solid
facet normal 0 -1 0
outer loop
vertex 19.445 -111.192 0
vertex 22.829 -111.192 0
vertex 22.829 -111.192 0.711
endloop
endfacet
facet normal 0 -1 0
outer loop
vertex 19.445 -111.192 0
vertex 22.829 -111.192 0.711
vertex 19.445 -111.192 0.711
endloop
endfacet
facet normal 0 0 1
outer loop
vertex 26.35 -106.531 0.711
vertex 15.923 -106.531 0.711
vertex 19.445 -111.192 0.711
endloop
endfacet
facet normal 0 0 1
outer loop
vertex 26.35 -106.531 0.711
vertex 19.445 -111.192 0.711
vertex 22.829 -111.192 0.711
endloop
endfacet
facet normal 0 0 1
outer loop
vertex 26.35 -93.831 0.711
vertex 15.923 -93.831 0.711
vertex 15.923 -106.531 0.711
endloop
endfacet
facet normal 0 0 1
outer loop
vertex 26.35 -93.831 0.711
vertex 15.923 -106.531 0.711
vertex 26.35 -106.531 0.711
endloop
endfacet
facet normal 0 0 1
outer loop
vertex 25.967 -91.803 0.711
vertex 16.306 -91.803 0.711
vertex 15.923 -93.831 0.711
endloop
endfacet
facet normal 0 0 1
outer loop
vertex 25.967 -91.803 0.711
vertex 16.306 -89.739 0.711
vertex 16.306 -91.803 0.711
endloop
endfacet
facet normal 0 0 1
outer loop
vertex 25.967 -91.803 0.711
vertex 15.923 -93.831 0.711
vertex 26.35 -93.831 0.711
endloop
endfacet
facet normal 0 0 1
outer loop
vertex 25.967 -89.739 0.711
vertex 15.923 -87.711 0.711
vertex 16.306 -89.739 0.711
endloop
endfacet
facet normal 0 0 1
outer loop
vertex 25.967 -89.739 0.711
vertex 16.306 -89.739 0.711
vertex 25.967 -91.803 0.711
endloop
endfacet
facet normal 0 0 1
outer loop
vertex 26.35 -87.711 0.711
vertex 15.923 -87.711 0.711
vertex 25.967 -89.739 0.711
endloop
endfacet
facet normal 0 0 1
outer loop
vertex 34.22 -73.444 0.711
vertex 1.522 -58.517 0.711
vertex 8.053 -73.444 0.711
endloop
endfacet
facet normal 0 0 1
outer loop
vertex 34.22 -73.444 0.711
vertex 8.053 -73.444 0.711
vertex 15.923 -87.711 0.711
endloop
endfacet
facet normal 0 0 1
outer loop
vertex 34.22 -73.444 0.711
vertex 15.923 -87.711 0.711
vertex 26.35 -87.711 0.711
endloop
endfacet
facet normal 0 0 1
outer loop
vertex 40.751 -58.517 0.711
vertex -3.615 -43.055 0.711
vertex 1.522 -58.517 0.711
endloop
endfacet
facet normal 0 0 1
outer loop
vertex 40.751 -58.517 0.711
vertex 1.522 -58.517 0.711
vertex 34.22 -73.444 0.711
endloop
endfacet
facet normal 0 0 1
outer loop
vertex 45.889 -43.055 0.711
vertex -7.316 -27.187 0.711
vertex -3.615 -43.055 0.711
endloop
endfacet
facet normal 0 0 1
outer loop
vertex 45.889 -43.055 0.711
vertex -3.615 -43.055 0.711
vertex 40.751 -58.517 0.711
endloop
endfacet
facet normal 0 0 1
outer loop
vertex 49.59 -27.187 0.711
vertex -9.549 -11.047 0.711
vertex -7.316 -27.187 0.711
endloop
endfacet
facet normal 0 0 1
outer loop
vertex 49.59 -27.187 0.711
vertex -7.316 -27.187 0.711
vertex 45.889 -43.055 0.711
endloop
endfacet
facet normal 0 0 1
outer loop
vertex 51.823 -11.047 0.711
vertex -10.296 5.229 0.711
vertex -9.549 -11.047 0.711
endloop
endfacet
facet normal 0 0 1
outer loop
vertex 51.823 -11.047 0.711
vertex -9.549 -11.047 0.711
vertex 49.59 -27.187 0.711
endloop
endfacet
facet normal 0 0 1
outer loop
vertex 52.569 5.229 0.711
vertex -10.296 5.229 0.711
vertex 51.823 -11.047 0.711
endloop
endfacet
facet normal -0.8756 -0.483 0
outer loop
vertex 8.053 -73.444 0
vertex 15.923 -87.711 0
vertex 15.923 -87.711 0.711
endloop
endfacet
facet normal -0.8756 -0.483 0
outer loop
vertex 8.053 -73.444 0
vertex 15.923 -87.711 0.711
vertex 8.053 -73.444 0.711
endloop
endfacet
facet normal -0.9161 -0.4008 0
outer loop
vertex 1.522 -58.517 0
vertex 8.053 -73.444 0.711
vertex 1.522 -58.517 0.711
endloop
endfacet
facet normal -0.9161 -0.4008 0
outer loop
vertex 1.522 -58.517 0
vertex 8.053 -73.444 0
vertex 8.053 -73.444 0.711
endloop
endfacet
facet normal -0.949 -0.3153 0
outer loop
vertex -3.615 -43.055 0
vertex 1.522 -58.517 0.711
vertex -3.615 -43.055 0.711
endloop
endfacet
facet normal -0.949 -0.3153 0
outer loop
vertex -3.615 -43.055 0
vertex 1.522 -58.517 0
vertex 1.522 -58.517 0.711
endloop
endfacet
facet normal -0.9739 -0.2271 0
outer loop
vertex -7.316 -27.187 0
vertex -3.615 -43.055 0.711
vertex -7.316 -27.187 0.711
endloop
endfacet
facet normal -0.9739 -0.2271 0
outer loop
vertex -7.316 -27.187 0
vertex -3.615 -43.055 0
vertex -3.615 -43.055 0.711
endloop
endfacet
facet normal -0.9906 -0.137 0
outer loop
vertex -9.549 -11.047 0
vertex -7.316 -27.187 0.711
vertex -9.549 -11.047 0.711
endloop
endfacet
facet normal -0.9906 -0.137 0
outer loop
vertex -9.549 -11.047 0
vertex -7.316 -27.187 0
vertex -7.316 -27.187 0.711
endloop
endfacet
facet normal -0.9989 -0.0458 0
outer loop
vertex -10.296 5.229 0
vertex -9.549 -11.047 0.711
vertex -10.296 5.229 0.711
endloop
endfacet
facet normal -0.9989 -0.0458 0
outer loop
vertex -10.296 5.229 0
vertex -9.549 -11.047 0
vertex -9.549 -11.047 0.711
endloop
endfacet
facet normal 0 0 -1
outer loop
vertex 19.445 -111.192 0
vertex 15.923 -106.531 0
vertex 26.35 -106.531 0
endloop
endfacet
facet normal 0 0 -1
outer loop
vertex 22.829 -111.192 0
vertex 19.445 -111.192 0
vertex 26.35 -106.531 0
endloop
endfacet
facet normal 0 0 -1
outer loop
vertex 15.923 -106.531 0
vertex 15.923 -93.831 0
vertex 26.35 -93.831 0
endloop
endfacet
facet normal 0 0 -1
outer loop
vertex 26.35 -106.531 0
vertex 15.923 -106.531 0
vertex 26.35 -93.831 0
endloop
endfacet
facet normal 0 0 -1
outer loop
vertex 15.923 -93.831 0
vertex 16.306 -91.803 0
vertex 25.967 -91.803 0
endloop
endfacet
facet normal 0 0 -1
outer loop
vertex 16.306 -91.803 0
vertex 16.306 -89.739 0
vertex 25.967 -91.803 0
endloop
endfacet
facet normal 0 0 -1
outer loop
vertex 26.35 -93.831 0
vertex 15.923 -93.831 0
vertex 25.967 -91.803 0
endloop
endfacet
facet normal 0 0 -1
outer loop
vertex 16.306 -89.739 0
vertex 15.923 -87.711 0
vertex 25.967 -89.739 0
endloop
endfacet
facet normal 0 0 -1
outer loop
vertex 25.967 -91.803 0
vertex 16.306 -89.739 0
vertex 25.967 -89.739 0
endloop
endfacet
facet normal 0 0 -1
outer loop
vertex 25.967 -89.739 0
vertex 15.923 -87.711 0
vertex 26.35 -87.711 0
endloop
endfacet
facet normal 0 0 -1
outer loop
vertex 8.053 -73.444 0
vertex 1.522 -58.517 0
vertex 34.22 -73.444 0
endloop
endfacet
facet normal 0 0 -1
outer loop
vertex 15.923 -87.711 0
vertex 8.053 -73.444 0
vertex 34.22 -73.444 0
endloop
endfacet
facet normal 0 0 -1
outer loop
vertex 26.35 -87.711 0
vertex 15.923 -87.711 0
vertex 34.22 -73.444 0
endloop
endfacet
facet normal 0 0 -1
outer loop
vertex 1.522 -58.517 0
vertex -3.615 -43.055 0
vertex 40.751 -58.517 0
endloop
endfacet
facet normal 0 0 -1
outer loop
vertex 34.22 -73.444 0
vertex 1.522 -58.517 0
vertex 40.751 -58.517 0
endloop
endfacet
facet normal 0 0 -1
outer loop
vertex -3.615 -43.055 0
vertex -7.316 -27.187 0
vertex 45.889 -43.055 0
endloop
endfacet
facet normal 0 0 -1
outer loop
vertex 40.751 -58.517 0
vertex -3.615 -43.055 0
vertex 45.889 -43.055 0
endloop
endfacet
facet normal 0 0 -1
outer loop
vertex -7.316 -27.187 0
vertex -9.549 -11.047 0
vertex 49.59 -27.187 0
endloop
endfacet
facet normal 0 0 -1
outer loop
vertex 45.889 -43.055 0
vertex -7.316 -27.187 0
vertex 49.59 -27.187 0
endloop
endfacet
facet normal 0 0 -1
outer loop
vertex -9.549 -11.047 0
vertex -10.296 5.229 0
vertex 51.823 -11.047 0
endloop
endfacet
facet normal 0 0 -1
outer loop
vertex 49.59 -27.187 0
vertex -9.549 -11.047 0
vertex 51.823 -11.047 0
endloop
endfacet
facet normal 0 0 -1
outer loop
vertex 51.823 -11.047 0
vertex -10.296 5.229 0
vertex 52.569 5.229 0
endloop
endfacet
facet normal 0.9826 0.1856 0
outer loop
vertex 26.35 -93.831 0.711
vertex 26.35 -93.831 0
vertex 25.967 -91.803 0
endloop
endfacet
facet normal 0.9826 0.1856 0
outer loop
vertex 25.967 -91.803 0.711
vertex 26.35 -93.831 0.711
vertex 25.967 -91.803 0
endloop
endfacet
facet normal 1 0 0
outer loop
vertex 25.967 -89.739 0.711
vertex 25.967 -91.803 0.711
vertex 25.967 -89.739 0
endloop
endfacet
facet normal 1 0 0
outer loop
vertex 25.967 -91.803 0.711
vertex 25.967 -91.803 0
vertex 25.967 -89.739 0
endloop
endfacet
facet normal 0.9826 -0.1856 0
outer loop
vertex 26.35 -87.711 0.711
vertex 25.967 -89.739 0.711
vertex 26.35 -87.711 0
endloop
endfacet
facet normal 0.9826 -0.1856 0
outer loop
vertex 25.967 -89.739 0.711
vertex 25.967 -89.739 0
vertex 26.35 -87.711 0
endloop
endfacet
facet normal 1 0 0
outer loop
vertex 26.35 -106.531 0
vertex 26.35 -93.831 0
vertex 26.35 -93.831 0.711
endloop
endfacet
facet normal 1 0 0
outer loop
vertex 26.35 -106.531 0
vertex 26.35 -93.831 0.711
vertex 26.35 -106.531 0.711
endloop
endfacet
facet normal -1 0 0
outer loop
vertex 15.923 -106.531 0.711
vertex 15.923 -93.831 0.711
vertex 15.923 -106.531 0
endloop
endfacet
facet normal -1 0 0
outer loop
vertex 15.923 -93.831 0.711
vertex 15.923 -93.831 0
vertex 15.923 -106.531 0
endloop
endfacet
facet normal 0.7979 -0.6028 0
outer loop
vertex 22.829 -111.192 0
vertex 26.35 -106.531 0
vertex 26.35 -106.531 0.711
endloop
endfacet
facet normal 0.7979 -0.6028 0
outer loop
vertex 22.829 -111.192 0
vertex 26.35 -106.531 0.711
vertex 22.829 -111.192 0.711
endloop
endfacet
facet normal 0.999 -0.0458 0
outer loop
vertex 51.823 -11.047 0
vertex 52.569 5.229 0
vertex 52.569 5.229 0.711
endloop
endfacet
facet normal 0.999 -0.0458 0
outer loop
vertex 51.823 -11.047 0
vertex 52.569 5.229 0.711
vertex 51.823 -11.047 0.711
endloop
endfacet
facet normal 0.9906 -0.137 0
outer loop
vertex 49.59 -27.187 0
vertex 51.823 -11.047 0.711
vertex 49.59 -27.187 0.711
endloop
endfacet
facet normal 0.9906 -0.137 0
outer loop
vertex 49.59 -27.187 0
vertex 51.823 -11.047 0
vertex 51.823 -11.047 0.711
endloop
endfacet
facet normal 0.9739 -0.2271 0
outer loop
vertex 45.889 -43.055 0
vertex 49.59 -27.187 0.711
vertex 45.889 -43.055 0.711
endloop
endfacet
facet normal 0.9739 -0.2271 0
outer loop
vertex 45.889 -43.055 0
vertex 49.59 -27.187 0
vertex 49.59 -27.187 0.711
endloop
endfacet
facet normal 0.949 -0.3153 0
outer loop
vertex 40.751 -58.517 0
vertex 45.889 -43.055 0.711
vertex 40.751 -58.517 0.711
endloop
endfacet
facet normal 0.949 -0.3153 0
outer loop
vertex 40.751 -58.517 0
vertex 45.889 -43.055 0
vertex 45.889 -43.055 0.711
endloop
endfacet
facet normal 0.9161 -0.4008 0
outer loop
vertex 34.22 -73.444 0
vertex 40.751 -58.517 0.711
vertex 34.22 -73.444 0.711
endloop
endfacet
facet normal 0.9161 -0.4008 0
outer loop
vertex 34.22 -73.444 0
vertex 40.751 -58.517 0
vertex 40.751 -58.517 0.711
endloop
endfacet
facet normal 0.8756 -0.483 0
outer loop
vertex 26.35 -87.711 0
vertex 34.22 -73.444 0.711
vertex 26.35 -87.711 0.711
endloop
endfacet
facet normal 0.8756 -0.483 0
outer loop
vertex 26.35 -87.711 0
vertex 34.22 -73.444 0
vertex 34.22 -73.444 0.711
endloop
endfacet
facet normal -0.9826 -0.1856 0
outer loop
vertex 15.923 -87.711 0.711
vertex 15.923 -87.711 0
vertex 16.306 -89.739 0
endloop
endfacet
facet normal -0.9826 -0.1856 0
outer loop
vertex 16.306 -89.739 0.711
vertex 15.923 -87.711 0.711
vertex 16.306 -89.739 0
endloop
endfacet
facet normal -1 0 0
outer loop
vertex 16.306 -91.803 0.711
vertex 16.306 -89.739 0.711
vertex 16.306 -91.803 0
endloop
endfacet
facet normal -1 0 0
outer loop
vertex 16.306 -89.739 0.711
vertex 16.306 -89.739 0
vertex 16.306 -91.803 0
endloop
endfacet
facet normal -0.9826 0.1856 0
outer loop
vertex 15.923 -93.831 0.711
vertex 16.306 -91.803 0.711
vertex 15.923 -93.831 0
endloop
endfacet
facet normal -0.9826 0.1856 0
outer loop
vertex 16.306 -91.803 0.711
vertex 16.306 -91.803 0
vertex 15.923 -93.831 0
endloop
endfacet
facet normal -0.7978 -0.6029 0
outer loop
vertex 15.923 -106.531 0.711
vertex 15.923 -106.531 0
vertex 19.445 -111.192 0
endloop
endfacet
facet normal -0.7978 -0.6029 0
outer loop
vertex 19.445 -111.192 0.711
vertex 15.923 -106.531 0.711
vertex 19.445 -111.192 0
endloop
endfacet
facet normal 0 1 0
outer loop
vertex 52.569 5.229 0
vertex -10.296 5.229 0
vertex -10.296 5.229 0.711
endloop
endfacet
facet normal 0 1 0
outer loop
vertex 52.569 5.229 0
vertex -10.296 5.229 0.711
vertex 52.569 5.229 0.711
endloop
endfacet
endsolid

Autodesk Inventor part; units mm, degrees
ref_plane "YZ Plane" through (0, 0, 0) normal (1, 0, 0) x (0, 1, 0)
ref_plane "XZ Plane" through (0, 0, 0) normal (0, 1, 0) x (-1, 0, 0)
ref_plane "XY Plane" through (0, 0, 0) normal (0, 0, 1) x (1, 0, 0)
sketch "Sketch1" plane through (0, 0, 0) normal (0, 0, 1) x (1, 0, 0)
  line L0 (-10.2957, 5.2289) -> (52.5693, 5.2289)
  line L1 (-10.2957, 5.2289) -> (15.9234, -93.8311) construction
  line L2 (15.9234, -93.8311) -> (26.3501, -93.8311) construction
  line L3 (15.9234, -93.8311) -> (15.9234, -106.5311)
  line L4 (26.3501, -93.8311) -> (26.3501, -106.5311)
  arc A0 (26.3501, -87.7106) -> (26.3501, -93.8311) centre (36.9972, -90.7709) ccw
  arc A1 (26.3501, -87.7106) -> (52.5693, 5.2289) centre (-125.2627, 5.2289) ccw
  line L5 (21.1368, 5.2289) -> (21.1368, -93.8311) construction
  arc A2 (15.9234, -93.8311) -> (15.9234, -87.7106) centre (5.2764, -90.7709) ccw
  arc A3 (-10.2957, 5.2289) -> (15.9234, -87.7106) centre (167.5363, 5.2289) ccw
  line L6 (26.3501, -106.5311) -> (23.352, -113.2427) construction
  line L7 (26.3501, -106.5311) -> (22.8287, -111.1925)
  line L8 (22.8287, -111.1925) -> (19.4449, -111.1925)
  line L9 (15.9234, -106.5311) -> (19.4449, -111.1925)
  point P0 (0, 0)
  point P1 (8.355, -65.2363)
  dimension "d10" = 10.4267
  dimension "d11" = 12.7
  dimension "d12" = 99.06
  dimension "d15" = 5.842
  dimension "d16" = 5.842
  dimension "d19" = 62.865
  dimension "d20" = 3.3838
extrude "Extrusion1" add sketch "Sketch1" along normal blind 0.7112
sketch "Sketch2" plane through (0, 0, 0.7112) normal (0, 0, 1) x (1, 0, 0)
  arc A0 (-10.2957, 5.2289) -> (15.9234, -87.7106) centre (167.5363, 5.2289) ccw projected
  arc A1 (26.3501, -87.7106) -> (26.3501, -93.8311) centre (36.9972, -90.7709) ccw
  arc A2 (15.9234, -93.8311) -> (15.9234, -87.7106) centre (5.2764, -90.7709) ccw projected
  line L0 (15.9234, -87.7106) -> (26.3501, -87.7106)
  point P0 (0, 0)
sketch "Sketch3" plane through (0, 0, 0.7112) normal (0, 0, 1) x (1, 0, 0)
  arc A0 (-10.2957, 5.2289) -> (15.9234, -87.7106) centre (167.5363, 5.2289) ccw projected
  line L0 (8.288, -73.9178) -> (33.9856, -73.9178)
  arc A1 (26.3501, -87.7106) -> (52.5693, 5.2289) centre (-125.2627, 5.2289) ccw projected
  point P0 (0, 0)
properties part number "Dis"
